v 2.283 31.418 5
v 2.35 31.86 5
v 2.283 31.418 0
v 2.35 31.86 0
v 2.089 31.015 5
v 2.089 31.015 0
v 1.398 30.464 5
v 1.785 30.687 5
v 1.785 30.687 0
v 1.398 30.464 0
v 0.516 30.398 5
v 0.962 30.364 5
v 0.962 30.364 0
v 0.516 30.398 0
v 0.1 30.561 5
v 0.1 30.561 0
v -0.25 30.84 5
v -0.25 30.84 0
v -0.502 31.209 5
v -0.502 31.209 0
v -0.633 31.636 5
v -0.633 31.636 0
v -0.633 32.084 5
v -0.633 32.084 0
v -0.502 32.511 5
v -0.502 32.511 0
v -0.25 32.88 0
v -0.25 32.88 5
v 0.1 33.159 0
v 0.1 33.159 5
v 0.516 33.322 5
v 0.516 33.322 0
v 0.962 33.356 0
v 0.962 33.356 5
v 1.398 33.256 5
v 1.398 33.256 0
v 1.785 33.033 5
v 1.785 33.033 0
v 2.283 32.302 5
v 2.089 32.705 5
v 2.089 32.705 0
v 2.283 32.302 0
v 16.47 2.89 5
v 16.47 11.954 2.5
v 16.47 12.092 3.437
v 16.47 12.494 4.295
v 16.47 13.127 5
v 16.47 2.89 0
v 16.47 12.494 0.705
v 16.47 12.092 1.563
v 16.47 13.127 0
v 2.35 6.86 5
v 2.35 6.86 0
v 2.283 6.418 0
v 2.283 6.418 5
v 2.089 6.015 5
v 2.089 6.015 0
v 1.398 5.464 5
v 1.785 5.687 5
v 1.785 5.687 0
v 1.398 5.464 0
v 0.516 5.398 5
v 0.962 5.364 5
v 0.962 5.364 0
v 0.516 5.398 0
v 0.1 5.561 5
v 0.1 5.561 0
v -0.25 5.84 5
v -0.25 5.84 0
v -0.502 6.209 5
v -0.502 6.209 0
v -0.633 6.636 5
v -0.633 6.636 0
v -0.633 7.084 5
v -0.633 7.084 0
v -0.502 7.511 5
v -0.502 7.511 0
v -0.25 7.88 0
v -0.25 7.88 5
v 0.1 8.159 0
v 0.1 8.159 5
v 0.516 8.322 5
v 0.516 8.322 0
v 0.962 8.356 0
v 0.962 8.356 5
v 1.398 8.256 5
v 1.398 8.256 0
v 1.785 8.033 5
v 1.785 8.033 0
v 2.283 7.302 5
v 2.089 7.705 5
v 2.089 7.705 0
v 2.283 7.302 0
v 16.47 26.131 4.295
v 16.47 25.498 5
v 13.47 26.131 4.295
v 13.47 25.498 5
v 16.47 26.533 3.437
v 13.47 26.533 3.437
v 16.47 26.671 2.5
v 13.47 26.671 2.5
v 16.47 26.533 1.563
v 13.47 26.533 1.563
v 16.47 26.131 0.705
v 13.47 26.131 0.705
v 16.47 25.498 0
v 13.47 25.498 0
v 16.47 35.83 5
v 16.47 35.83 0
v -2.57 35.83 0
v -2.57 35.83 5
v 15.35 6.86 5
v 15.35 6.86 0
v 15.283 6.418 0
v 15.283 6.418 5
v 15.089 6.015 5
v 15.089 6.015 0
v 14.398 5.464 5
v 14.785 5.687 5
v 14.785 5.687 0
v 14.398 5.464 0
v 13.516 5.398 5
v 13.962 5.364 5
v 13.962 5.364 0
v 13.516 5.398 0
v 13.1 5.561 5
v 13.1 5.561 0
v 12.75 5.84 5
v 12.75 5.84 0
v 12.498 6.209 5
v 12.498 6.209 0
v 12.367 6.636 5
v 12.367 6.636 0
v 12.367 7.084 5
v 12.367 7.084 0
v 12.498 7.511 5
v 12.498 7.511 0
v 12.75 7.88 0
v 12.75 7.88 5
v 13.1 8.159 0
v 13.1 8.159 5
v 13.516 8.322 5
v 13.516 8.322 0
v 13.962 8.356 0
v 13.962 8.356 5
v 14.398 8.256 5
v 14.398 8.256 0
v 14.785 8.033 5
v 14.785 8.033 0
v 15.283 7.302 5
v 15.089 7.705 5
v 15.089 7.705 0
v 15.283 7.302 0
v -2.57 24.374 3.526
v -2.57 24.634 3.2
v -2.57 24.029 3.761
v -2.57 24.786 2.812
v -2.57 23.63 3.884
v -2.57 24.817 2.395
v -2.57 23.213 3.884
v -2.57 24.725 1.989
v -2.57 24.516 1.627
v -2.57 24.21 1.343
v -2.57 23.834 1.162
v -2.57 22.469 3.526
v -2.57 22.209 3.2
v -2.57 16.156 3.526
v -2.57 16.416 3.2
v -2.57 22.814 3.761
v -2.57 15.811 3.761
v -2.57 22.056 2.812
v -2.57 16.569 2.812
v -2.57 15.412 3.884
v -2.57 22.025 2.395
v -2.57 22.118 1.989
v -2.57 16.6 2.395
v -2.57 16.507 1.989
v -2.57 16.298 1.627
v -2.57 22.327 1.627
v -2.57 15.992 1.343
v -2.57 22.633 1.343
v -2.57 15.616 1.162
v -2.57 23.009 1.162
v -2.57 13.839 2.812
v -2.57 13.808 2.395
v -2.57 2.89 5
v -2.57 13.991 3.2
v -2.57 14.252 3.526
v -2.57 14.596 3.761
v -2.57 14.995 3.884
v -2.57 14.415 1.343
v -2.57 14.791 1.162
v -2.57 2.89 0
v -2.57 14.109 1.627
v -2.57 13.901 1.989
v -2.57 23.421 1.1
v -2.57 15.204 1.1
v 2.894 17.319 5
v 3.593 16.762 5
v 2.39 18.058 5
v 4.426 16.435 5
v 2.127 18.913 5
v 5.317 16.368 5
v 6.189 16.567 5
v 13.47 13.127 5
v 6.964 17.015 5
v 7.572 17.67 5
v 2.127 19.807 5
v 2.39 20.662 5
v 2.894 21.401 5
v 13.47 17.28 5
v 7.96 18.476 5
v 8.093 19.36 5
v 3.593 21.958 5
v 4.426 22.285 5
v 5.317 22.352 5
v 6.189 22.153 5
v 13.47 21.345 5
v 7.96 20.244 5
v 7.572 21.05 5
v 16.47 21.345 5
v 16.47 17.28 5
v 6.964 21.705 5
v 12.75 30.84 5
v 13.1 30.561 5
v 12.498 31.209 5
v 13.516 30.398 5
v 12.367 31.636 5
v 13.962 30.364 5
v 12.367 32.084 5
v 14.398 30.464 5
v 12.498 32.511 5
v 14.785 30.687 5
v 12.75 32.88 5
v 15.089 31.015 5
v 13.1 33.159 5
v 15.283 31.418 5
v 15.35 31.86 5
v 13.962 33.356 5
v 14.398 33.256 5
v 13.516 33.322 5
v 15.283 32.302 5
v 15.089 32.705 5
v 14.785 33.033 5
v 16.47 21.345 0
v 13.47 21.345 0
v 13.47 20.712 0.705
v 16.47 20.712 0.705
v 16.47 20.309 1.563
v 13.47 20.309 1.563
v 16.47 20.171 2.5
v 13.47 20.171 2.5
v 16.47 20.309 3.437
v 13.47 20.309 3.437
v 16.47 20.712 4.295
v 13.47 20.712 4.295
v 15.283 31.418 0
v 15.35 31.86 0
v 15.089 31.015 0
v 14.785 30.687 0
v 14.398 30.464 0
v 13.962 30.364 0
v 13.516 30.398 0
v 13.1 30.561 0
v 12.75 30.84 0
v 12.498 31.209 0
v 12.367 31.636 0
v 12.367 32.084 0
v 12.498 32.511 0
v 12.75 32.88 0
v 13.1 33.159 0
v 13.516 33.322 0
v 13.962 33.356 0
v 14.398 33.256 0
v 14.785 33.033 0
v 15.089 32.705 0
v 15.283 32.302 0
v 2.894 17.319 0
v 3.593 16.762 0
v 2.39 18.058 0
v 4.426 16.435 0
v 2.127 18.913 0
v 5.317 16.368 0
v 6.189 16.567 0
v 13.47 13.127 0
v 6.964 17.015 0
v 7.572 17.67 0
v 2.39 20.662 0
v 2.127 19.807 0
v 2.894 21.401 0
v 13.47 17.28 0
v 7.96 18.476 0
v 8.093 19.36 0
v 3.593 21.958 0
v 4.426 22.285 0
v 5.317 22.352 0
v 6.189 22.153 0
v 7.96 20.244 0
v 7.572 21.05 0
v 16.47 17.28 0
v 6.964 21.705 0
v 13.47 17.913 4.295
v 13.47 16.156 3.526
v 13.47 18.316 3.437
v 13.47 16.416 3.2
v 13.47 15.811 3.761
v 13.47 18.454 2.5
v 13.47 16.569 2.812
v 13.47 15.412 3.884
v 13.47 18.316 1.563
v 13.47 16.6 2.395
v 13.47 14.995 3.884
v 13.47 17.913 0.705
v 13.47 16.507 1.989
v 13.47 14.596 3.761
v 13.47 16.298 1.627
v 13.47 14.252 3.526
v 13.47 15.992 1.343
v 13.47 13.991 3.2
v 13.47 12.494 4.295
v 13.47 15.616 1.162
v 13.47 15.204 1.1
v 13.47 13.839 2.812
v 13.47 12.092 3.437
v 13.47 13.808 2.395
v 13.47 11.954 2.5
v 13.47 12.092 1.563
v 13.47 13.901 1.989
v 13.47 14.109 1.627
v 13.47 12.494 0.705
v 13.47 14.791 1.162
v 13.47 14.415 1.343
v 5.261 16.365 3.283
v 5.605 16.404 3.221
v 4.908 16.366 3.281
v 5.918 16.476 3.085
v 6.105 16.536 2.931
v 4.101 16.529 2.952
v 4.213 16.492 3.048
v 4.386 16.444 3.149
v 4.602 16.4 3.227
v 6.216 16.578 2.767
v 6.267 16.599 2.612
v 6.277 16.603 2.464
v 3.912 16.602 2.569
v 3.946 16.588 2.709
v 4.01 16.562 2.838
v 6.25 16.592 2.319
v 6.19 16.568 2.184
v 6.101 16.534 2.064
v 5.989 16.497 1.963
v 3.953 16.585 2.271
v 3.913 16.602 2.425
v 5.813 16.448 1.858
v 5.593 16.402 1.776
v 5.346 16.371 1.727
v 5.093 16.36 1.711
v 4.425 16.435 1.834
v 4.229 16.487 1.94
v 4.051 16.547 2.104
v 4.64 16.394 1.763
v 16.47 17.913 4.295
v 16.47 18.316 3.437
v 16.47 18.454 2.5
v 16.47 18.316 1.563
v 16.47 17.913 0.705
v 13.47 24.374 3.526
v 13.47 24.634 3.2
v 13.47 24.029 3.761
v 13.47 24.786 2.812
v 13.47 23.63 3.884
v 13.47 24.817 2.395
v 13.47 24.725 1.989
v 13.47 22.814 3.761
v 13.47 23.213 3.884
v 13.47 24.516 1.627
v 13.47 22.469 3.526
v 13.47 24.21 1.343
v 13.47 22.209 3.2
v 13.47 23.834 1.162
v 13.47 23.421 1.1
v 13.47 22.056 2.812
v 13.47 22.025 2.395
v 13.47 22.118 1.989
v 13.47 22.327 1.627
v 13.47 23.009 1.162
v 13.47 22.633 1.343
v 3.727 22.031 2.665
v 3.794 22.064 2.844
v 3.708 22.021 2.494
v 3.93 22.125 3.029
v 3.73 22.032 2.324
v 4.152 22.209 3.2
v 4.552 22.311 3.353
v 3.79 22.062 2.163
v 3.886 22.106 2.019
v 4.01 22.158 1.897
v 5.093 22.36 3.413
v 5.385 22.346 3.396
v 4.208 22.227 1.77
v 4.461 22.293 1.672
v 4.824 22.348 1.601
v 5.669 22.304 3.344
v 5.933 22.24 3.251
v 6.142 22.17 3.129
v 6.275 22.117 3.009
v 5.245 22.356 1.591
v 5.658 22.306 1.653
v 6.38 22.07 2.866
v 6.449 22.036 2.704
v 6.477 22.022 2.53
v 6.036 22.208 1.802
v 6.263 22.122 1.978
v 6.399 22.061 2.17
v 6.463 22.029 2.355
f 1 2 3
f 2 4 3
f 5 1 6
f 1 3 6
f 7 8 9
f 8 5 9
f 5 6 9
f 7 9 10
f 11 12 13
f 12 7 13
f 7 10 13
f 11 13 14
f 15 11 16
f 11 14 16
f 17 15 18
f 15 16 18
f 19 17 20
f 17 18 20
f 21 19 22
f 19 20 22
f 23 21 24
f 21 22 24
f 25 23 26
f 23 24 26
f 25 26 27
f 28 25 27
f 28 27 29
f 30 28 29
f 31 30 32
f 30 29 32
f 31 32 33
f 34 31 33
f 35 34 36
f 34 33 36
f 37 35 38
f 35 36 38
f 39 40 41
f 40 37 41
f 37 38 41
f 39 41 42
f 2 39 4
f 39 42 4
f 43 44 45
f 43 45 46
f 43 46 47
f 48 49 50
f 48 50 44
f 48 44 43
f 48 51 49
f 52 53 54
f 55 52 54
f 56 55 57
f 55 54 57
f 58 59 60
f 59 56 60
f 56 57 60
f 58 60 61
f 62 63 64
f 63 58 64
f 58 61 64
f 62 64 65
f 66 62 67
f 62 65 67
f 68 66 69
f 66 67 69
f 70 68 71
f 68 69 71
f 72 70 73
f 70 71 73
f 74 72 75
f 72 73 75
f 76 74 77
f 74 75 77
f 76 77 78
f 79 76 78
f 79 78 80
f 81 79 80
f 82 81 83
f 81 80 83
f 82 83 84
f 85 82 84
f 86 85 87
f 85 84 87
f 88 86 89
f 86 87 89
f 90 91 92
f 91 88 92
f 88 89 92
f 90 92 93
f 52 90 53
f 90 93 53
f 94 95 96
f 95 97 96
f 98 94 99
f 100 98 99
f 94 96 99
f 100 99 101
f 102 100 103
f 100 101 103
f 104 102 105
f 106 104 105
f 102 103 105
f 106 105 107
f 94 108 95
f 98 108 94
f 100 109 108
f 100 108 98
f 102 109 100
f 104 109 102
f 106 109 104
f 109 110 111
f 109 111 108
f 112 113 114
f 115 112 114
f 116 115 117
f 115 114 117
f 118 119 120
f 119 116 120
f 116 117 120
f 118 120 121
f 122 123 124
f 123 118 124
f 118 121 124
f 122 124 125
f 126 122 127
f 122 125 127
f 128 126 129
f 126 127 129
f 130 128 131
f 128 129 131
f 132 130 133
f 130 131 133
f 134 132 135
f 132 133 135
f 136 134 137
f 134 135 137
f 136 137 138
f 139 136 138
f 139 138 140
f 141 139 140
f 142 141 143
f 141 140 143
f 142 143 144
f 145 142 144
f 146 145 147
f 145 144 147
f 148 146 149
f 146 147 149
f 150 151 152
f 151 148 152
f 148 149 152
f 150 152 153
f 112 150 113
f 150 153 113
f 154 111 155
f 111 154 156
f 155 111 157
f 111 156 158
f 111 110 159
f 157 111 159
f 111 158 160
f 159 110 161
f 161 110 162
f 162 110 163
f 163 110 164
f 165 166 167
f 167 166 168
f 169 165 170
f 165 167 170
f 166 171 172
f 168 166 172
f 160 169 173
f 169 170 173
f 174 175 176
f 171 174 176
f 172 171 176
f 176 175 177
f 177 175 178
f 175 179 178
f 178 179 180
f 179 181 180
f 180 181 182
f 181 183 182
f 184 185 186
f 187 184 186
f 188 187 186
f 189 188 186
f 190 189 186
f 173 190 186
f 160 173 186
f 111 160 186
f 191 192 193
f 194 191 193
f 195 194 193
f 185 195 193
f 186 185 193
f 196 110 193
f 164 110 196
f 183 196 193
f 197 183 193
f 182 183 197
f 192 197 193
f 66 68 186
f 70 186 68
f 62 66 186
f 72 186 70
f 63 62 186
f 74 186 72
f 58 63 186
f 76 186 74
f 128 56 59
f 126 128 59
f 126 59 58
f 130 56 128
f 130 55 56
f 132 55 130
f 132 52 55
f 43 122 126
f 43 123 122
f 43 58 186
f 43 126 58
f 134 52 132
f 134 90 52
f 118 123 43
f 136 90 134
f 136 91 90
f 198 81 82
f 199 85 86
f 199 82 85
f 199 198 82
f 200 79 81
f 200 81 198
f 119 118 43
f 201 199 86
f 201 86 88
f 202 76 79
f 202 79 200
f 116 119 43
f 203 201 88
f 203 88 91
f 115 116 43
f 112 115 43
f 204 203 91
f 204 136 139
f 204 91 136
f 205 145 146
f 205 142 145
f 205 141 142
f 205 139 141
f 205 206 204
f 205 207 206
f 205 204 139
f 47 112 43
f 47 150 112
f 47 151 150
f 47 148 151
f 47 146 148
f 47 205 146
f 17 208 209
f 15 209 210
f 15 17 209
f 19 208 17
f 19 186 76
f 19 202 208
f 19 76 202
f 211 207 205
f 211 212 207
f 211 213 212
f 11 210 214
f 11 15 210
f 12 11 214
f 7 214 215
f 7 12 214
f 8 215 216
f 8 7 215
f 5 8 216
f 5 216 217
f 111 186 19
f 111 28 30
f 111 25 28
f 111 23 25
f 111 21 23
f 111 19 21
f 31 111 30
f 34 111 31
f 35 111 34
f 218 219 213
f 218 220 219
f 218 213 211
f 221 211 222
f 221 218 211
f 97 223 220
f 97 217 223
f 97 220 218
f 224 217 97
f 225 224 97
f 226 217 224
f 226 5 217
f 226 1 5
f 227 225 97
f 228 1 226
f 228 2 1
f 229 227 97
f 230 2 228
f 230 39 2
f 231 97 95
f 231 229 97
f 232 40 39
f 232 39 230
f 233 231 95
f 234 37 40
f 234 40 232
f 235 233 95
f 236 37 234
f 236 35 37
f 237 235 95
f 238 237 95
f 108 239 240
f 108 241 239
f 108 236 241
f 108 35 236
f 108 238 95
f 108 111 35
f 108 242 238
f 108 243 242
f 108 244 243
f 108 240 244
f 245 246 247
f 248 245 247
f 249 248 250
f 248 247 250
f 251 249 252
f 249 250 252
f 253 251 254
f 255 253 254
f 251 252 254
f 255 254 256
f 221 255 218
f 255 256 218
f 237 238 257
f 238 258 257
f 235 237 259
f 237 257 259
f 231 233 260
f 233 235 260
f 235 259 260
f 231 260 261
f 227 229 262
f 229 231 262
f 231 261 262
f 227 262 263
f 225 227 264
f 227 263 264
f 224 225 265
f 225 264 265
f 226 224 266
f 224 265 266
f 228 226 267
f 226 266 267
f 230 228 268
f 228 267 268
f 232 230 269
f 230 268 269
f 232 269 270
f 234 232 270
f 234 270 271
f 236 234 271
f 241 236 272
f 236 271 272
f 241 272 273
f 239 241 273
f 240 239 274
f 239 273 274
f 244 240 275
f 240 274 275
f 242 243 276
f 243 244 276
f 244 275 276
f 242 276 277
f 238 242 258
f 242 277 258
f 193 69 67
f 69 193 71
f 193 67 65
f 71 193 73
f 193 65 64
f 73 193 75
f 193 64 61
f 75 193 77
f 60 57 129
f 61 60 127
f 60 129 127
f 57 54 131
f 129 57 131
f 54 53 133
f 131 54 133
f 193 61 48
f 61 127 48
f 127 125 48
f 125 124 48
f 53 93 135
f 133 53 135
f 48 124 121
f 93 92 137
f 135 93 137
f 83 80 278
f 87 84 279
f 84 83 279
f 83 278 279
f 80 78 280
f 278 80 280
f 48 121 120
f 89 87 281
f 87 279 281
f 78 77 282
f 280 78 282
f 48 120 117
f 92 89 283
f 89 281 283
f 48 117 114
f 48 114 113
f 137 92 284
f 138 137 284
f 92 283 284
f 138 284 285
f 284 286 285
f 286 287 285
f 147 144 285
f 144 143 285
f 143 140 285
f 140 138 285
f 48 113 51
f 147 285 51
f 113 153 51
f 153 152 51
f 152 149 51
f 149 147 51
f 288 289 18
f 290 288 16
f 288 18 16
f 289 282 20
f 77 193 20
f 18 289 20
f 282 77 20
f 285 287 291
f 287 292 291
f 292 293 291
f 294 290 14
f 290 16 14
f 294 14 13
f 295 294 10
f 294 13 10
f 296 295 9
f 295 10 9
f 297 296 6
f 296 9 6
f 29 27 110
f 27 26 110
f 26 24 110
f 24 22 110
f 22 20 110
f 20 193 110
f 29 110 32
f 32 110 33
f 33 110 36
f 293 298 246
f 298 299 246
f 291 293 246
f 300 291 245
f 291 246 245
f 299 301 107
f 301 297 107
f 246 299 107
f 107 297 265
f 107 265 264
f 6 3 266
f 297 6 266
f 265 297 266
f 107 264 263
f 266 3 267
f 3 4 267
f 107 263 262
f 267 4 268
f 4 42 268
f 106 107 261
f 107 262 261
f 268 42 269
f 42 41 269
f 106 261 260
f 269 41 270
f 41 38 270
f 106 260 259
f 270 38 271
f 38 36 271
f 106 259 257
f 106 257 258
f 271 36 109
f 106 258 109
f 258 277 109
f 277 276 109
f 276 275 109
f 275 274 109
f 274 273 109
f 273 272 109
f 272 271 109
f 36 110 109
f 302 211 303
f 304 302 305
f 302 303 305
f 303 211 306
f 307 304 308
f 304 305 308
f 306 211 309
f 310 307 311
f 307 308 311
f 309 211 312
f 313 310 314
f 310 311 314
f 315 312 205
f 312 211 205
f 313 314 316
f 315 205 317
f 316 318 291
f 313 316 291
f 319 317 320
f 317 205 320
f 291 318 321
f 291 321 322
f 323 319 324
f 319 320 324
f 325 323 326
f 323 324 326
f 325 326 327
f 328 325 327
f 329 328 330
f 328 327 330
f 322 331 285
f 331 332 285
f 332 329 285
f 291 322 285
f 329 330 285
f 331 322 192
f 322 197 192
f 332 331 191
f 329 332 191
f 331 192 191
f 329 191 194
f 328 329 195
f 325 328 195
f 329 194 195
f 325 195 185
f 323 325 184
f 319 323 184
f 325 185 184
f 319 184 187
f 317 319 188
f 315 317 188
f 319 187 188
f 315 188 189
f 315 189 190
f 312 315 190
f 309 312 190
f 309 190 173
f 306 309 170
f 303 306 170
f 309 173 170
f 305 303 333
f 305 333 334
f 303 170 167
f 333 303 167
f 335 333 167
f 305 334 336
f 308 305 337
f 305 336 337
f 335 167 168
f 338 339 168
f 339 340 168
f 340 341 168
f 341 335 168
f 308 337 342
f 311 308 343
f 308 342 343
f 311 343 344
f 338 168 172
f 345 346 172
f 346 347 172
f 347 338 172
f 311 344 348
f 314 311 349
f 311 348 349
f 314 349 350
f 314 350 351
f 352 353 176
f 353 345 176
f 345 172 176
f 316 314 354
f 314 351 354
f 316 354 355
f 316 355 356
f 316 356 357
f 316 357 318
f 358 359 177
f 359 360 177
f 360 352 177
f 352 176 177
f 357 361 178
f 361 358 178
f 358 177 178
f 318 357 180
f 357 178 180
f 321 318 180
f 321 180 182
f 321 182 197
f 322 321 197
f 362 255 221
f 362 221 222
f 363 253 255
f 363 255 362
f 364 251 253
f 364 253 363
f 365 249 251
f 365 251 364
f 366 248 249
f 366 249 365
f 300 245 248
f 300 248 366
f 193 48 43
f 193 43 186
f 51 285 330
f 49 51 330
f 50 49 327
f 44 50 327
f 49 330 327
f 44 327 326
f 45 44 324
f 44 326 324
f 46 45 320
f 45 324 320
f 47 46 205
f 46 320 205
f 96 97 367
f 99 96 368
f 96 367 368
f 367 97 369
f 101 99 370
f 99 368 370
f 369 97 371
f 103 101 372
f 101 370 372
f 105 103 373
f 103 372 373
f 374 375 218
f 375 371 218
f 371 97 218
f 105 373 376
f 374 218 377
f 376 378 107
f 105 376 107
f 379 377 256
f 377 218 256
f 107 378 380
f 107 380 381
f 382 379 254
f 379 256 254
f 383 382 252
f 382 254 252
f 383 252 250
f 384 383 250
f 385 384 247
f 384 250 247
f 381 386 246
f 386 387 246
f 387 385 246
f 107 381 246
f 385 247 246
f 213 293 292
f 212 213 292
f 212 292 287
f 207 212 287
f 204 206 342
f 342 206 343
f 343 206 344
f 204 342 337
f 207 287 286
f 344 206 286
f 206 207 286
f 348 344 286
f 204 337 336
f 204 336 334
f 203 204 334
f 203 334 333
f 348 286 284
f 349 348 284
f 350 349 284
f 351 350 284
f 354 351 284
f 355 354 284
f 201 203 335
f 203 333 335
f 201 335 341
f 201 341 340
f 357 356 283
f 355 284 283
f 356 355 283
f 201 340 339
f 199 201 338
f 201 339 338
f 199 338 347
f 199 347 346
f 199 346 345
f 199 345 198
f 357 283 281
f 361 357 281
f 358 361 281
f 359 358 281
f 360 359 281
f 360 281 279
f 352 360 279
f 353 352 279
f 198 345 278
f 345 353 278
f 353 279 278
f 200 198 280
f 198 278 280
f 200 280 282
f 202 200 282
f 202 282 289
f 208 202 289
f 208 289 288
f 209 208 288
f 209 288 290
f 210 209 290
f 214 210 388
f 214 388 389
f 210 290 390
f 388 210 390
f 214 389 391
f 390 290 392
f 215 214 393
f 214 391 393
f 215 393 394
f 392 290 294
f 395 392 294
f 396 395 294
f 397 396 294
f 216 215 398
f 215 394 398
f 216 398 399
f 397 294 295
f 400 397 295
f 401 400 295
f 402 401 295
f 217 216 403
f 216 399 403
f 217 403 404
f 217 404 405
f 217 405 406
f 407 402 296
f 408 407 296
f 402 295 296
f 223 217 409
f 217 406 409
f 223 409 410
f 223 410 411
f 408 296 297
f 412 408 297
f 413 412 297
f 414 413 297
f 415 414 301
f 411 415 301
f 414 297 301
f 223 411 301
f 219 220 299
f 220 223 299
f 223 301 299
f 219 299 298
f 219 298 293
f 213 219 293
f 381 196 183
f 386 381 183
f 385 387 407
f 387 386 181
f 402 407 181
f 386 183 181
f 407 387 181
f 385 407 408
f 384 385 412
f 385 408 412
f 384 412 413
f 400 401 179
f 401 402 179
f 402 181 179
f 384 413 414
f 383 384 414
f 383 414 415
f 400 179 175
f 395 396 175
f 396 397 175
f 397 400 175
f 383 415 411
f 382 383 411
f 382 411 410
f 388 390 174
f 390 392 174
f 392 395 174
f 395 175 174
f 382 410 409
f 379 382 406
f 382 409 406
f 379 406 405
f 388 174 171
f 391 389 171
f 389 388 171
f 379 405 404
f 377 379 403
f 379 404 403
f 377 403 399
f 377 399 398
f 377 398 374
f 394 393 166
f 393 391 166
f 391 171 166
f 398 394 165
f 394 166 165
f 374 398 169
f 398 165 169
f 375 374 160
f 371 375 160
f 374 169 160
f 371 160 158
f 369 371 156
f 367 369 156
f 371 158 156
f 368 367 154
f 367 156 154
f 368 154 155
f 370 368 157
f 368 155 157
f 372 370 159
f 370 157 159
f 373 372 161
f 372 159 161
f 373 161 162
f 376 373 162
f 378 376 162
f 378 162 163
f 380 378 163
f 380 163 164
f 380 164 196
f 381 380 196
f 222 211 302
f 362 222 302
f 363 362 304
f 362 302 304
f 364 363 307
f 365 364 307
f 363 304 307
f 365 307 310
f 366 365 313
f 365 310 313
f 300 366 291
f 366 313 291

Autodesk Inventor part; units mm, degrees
ref_plane "YZ Plane" through (0, 0, 0) normal (1, 0, 0) x (0, 1, 0)
ref_plane "XZ Plane" through (0, 0, 0) normal (0, 1, 0) x (-1, 0, 0)
ref_plane "XY Plane" through (0, 0, 0) normal (0, 0, 1) x (1, 0, 0)
ref_plane "Arbeitsebene1" through (-0.0002, 0, 0) normal (0, 0, 1) x (1, 0, 0)
sketch "Skizze1" plane through (-0.0002, 0, 0) normal (0, 0, 1) x (1, 0, 0)
  circle A0 centre (13.85, 6.86) radius 1.5
  circle A1 centre (0.85, 31.86) radius 1.5
  circle A2 centre (13.85, 31.86) radius 1.5
  circle A3 centre (0.85, 6.86) radius 1.5
  circle A4 centre (5.0933, 19.36) radius 5.5
  line L0 (-3.07, 5.49) -> (-3.07, 33.23)
  line L1 (-3.07, 5.49) -> (-16.87, 5.49)
  line L2 (-16.87, 13.31) -> (-16.87, 5.49)
  line L3 (-16.8476, 13.31) -> (-16.87, 13.31)
  line L4 (-16.8476, 25.41) -> (-16.8476, 13.31)
  line L5 (-16.87, 25.41) -> (-16.8476, 25.41)
  line L6 (-16.87, 33.23) -> (-16.87, 25.41)
  line L7 (-3.07, 33.23) -> (-16.87, 33.23)
  line L8 (-16.87, 40.13) -> (-16.87, 44.21)
  line L9 (-20.77, 36.23) -> (-16.87, 40.13)
  line L10 (-24.85, 36.23) -> (-20.77, 36.23)
  line L11 (-24.85, 2.49) -> (-24.85, 36.23)
  line L12 (-20.77, 2.49) -> (-24.85, 2.49)
  line L13 (-16.87, -1.41) -> (-20.77, 2.49)
  line L14 (-16.87, -1.41) -> (-16.87, -5.49)
  line L15 (-16.87, -5.49) -> (16.87, -5.49)
  line L16 (16.87, -5.49) -> (16.87, -1.41)
  line L17 (20.77, 2.49) -> (16.87, -1.41)
  line L18 (24.85, 2.49) -> (20.77, 2.49)
  line L19 (24.85, 36.23) -> (24.85, 2.49)
  line L20 (20.77, 36.23) -> (24.85, 36.23)
  line L21 (16.87, 40.13) -> (20.77, 36.23)
  line L22 (16.87, 44.21) -> (16.87, 40.13)
  line L23 (-16.87, 44.21) -> (16.87, 44.21)
  line L24 (16.97, 36.33) -> (16.97, 2.39)
  line L25 (-16.97, 36.33) -> (16.97, 36.33) construction
  line L26 (-16.97, 2.39) -> (-16.97, 36.33)
  line L27 (16.97, 2.39) -> (-16.97, 2.39) construction
  line L28 (16.97, 2.39) -> (-16.97, 2.39)
  line L29 (16.47, 35.83) -> (16.47, 2.89)
  line L30 (16.47, 2.89) -> (-16.47, 2.89)
  line L31 (-16.47, 2.89) -> (-16.47, 35.83)
  line L32 (-16.47, 35.83) -> (16.47, 35.83)
  line L33 (-2.57, 35.83) -> (-2.57, 2.89)
  circle A5 centre (5.0933, 19.36) radius 3.505
  circle A6 centre (5.0933, 19.36) radius 3
  point P0 (0.0002, 0)
extrude "Extrusion1" add sketch "Skizze1" along normal blind 5 contours A4 | L33 L32 L29 L30 | A5
sketch "Skizze5" plane through (16.4698, 2.89, 0) normal (1, 0, 0) x (0, 0, -1)
  line L0 (-23, 19.975) -> (-13.08, 19.975)
  line L1 (-23, 12.965) -> (-13.08, 12.965)
  circle A0 centre (-2.5, 20.5313) radius 1.4
  circle A1 centre (-2.5, 12.3138) radius 1.4
  line L2 (0, 0) -> (0, 32.94) projected
  line L3 (0, 32.94) -> (-5, 32.94) projected
  line L4 (-5, 0) -> (-5, 32.94) projected
  line L5 (0, 0) -> (-5, 0) projected
  line L6 (-5, 13.47) -> (-5, 19.47) projected
  line L7 (0, 13.47) -> (0, 19.47) projected
  line L8 (-5, 32.94) -> (-5, 0) projected
  line L9 (-5, 0) -> (-5, 32.94) projected
  line L10 (-5, 2.47) -> (-5, 5.47) projected
  line L11 (-5, 27.47) -> (-5, 30.47) projected
  line L12 (-5, 27.47) -> (-5, 30.47) projected
  line L13 (-5, 2.47) -> (-5, 5.47) projected
  line L14 (-5, 13.47) -> (-5, 19.47) projected
  line L15 (-5, 19.47) -> (0, 19.47) projected
  line L16 (-5, 13.47) -> (0, 13.47) projected
  point P0 (0, -2.89)
  dimension "d19" = 2.8
  dimension "d20" = 2.8
hole "Bohrung2" at (16.4698, 23.4213, 2.5) at (16.4698, 15.2038, 2.5) direction (-1, 0, 0) diameter 2.8 depth 30 counterbore diameter 6.5 counterbore depth 3
properties part number "30_Cube_Z_Focus_NEMA8_captive_micrometerscrewbase_v0"
